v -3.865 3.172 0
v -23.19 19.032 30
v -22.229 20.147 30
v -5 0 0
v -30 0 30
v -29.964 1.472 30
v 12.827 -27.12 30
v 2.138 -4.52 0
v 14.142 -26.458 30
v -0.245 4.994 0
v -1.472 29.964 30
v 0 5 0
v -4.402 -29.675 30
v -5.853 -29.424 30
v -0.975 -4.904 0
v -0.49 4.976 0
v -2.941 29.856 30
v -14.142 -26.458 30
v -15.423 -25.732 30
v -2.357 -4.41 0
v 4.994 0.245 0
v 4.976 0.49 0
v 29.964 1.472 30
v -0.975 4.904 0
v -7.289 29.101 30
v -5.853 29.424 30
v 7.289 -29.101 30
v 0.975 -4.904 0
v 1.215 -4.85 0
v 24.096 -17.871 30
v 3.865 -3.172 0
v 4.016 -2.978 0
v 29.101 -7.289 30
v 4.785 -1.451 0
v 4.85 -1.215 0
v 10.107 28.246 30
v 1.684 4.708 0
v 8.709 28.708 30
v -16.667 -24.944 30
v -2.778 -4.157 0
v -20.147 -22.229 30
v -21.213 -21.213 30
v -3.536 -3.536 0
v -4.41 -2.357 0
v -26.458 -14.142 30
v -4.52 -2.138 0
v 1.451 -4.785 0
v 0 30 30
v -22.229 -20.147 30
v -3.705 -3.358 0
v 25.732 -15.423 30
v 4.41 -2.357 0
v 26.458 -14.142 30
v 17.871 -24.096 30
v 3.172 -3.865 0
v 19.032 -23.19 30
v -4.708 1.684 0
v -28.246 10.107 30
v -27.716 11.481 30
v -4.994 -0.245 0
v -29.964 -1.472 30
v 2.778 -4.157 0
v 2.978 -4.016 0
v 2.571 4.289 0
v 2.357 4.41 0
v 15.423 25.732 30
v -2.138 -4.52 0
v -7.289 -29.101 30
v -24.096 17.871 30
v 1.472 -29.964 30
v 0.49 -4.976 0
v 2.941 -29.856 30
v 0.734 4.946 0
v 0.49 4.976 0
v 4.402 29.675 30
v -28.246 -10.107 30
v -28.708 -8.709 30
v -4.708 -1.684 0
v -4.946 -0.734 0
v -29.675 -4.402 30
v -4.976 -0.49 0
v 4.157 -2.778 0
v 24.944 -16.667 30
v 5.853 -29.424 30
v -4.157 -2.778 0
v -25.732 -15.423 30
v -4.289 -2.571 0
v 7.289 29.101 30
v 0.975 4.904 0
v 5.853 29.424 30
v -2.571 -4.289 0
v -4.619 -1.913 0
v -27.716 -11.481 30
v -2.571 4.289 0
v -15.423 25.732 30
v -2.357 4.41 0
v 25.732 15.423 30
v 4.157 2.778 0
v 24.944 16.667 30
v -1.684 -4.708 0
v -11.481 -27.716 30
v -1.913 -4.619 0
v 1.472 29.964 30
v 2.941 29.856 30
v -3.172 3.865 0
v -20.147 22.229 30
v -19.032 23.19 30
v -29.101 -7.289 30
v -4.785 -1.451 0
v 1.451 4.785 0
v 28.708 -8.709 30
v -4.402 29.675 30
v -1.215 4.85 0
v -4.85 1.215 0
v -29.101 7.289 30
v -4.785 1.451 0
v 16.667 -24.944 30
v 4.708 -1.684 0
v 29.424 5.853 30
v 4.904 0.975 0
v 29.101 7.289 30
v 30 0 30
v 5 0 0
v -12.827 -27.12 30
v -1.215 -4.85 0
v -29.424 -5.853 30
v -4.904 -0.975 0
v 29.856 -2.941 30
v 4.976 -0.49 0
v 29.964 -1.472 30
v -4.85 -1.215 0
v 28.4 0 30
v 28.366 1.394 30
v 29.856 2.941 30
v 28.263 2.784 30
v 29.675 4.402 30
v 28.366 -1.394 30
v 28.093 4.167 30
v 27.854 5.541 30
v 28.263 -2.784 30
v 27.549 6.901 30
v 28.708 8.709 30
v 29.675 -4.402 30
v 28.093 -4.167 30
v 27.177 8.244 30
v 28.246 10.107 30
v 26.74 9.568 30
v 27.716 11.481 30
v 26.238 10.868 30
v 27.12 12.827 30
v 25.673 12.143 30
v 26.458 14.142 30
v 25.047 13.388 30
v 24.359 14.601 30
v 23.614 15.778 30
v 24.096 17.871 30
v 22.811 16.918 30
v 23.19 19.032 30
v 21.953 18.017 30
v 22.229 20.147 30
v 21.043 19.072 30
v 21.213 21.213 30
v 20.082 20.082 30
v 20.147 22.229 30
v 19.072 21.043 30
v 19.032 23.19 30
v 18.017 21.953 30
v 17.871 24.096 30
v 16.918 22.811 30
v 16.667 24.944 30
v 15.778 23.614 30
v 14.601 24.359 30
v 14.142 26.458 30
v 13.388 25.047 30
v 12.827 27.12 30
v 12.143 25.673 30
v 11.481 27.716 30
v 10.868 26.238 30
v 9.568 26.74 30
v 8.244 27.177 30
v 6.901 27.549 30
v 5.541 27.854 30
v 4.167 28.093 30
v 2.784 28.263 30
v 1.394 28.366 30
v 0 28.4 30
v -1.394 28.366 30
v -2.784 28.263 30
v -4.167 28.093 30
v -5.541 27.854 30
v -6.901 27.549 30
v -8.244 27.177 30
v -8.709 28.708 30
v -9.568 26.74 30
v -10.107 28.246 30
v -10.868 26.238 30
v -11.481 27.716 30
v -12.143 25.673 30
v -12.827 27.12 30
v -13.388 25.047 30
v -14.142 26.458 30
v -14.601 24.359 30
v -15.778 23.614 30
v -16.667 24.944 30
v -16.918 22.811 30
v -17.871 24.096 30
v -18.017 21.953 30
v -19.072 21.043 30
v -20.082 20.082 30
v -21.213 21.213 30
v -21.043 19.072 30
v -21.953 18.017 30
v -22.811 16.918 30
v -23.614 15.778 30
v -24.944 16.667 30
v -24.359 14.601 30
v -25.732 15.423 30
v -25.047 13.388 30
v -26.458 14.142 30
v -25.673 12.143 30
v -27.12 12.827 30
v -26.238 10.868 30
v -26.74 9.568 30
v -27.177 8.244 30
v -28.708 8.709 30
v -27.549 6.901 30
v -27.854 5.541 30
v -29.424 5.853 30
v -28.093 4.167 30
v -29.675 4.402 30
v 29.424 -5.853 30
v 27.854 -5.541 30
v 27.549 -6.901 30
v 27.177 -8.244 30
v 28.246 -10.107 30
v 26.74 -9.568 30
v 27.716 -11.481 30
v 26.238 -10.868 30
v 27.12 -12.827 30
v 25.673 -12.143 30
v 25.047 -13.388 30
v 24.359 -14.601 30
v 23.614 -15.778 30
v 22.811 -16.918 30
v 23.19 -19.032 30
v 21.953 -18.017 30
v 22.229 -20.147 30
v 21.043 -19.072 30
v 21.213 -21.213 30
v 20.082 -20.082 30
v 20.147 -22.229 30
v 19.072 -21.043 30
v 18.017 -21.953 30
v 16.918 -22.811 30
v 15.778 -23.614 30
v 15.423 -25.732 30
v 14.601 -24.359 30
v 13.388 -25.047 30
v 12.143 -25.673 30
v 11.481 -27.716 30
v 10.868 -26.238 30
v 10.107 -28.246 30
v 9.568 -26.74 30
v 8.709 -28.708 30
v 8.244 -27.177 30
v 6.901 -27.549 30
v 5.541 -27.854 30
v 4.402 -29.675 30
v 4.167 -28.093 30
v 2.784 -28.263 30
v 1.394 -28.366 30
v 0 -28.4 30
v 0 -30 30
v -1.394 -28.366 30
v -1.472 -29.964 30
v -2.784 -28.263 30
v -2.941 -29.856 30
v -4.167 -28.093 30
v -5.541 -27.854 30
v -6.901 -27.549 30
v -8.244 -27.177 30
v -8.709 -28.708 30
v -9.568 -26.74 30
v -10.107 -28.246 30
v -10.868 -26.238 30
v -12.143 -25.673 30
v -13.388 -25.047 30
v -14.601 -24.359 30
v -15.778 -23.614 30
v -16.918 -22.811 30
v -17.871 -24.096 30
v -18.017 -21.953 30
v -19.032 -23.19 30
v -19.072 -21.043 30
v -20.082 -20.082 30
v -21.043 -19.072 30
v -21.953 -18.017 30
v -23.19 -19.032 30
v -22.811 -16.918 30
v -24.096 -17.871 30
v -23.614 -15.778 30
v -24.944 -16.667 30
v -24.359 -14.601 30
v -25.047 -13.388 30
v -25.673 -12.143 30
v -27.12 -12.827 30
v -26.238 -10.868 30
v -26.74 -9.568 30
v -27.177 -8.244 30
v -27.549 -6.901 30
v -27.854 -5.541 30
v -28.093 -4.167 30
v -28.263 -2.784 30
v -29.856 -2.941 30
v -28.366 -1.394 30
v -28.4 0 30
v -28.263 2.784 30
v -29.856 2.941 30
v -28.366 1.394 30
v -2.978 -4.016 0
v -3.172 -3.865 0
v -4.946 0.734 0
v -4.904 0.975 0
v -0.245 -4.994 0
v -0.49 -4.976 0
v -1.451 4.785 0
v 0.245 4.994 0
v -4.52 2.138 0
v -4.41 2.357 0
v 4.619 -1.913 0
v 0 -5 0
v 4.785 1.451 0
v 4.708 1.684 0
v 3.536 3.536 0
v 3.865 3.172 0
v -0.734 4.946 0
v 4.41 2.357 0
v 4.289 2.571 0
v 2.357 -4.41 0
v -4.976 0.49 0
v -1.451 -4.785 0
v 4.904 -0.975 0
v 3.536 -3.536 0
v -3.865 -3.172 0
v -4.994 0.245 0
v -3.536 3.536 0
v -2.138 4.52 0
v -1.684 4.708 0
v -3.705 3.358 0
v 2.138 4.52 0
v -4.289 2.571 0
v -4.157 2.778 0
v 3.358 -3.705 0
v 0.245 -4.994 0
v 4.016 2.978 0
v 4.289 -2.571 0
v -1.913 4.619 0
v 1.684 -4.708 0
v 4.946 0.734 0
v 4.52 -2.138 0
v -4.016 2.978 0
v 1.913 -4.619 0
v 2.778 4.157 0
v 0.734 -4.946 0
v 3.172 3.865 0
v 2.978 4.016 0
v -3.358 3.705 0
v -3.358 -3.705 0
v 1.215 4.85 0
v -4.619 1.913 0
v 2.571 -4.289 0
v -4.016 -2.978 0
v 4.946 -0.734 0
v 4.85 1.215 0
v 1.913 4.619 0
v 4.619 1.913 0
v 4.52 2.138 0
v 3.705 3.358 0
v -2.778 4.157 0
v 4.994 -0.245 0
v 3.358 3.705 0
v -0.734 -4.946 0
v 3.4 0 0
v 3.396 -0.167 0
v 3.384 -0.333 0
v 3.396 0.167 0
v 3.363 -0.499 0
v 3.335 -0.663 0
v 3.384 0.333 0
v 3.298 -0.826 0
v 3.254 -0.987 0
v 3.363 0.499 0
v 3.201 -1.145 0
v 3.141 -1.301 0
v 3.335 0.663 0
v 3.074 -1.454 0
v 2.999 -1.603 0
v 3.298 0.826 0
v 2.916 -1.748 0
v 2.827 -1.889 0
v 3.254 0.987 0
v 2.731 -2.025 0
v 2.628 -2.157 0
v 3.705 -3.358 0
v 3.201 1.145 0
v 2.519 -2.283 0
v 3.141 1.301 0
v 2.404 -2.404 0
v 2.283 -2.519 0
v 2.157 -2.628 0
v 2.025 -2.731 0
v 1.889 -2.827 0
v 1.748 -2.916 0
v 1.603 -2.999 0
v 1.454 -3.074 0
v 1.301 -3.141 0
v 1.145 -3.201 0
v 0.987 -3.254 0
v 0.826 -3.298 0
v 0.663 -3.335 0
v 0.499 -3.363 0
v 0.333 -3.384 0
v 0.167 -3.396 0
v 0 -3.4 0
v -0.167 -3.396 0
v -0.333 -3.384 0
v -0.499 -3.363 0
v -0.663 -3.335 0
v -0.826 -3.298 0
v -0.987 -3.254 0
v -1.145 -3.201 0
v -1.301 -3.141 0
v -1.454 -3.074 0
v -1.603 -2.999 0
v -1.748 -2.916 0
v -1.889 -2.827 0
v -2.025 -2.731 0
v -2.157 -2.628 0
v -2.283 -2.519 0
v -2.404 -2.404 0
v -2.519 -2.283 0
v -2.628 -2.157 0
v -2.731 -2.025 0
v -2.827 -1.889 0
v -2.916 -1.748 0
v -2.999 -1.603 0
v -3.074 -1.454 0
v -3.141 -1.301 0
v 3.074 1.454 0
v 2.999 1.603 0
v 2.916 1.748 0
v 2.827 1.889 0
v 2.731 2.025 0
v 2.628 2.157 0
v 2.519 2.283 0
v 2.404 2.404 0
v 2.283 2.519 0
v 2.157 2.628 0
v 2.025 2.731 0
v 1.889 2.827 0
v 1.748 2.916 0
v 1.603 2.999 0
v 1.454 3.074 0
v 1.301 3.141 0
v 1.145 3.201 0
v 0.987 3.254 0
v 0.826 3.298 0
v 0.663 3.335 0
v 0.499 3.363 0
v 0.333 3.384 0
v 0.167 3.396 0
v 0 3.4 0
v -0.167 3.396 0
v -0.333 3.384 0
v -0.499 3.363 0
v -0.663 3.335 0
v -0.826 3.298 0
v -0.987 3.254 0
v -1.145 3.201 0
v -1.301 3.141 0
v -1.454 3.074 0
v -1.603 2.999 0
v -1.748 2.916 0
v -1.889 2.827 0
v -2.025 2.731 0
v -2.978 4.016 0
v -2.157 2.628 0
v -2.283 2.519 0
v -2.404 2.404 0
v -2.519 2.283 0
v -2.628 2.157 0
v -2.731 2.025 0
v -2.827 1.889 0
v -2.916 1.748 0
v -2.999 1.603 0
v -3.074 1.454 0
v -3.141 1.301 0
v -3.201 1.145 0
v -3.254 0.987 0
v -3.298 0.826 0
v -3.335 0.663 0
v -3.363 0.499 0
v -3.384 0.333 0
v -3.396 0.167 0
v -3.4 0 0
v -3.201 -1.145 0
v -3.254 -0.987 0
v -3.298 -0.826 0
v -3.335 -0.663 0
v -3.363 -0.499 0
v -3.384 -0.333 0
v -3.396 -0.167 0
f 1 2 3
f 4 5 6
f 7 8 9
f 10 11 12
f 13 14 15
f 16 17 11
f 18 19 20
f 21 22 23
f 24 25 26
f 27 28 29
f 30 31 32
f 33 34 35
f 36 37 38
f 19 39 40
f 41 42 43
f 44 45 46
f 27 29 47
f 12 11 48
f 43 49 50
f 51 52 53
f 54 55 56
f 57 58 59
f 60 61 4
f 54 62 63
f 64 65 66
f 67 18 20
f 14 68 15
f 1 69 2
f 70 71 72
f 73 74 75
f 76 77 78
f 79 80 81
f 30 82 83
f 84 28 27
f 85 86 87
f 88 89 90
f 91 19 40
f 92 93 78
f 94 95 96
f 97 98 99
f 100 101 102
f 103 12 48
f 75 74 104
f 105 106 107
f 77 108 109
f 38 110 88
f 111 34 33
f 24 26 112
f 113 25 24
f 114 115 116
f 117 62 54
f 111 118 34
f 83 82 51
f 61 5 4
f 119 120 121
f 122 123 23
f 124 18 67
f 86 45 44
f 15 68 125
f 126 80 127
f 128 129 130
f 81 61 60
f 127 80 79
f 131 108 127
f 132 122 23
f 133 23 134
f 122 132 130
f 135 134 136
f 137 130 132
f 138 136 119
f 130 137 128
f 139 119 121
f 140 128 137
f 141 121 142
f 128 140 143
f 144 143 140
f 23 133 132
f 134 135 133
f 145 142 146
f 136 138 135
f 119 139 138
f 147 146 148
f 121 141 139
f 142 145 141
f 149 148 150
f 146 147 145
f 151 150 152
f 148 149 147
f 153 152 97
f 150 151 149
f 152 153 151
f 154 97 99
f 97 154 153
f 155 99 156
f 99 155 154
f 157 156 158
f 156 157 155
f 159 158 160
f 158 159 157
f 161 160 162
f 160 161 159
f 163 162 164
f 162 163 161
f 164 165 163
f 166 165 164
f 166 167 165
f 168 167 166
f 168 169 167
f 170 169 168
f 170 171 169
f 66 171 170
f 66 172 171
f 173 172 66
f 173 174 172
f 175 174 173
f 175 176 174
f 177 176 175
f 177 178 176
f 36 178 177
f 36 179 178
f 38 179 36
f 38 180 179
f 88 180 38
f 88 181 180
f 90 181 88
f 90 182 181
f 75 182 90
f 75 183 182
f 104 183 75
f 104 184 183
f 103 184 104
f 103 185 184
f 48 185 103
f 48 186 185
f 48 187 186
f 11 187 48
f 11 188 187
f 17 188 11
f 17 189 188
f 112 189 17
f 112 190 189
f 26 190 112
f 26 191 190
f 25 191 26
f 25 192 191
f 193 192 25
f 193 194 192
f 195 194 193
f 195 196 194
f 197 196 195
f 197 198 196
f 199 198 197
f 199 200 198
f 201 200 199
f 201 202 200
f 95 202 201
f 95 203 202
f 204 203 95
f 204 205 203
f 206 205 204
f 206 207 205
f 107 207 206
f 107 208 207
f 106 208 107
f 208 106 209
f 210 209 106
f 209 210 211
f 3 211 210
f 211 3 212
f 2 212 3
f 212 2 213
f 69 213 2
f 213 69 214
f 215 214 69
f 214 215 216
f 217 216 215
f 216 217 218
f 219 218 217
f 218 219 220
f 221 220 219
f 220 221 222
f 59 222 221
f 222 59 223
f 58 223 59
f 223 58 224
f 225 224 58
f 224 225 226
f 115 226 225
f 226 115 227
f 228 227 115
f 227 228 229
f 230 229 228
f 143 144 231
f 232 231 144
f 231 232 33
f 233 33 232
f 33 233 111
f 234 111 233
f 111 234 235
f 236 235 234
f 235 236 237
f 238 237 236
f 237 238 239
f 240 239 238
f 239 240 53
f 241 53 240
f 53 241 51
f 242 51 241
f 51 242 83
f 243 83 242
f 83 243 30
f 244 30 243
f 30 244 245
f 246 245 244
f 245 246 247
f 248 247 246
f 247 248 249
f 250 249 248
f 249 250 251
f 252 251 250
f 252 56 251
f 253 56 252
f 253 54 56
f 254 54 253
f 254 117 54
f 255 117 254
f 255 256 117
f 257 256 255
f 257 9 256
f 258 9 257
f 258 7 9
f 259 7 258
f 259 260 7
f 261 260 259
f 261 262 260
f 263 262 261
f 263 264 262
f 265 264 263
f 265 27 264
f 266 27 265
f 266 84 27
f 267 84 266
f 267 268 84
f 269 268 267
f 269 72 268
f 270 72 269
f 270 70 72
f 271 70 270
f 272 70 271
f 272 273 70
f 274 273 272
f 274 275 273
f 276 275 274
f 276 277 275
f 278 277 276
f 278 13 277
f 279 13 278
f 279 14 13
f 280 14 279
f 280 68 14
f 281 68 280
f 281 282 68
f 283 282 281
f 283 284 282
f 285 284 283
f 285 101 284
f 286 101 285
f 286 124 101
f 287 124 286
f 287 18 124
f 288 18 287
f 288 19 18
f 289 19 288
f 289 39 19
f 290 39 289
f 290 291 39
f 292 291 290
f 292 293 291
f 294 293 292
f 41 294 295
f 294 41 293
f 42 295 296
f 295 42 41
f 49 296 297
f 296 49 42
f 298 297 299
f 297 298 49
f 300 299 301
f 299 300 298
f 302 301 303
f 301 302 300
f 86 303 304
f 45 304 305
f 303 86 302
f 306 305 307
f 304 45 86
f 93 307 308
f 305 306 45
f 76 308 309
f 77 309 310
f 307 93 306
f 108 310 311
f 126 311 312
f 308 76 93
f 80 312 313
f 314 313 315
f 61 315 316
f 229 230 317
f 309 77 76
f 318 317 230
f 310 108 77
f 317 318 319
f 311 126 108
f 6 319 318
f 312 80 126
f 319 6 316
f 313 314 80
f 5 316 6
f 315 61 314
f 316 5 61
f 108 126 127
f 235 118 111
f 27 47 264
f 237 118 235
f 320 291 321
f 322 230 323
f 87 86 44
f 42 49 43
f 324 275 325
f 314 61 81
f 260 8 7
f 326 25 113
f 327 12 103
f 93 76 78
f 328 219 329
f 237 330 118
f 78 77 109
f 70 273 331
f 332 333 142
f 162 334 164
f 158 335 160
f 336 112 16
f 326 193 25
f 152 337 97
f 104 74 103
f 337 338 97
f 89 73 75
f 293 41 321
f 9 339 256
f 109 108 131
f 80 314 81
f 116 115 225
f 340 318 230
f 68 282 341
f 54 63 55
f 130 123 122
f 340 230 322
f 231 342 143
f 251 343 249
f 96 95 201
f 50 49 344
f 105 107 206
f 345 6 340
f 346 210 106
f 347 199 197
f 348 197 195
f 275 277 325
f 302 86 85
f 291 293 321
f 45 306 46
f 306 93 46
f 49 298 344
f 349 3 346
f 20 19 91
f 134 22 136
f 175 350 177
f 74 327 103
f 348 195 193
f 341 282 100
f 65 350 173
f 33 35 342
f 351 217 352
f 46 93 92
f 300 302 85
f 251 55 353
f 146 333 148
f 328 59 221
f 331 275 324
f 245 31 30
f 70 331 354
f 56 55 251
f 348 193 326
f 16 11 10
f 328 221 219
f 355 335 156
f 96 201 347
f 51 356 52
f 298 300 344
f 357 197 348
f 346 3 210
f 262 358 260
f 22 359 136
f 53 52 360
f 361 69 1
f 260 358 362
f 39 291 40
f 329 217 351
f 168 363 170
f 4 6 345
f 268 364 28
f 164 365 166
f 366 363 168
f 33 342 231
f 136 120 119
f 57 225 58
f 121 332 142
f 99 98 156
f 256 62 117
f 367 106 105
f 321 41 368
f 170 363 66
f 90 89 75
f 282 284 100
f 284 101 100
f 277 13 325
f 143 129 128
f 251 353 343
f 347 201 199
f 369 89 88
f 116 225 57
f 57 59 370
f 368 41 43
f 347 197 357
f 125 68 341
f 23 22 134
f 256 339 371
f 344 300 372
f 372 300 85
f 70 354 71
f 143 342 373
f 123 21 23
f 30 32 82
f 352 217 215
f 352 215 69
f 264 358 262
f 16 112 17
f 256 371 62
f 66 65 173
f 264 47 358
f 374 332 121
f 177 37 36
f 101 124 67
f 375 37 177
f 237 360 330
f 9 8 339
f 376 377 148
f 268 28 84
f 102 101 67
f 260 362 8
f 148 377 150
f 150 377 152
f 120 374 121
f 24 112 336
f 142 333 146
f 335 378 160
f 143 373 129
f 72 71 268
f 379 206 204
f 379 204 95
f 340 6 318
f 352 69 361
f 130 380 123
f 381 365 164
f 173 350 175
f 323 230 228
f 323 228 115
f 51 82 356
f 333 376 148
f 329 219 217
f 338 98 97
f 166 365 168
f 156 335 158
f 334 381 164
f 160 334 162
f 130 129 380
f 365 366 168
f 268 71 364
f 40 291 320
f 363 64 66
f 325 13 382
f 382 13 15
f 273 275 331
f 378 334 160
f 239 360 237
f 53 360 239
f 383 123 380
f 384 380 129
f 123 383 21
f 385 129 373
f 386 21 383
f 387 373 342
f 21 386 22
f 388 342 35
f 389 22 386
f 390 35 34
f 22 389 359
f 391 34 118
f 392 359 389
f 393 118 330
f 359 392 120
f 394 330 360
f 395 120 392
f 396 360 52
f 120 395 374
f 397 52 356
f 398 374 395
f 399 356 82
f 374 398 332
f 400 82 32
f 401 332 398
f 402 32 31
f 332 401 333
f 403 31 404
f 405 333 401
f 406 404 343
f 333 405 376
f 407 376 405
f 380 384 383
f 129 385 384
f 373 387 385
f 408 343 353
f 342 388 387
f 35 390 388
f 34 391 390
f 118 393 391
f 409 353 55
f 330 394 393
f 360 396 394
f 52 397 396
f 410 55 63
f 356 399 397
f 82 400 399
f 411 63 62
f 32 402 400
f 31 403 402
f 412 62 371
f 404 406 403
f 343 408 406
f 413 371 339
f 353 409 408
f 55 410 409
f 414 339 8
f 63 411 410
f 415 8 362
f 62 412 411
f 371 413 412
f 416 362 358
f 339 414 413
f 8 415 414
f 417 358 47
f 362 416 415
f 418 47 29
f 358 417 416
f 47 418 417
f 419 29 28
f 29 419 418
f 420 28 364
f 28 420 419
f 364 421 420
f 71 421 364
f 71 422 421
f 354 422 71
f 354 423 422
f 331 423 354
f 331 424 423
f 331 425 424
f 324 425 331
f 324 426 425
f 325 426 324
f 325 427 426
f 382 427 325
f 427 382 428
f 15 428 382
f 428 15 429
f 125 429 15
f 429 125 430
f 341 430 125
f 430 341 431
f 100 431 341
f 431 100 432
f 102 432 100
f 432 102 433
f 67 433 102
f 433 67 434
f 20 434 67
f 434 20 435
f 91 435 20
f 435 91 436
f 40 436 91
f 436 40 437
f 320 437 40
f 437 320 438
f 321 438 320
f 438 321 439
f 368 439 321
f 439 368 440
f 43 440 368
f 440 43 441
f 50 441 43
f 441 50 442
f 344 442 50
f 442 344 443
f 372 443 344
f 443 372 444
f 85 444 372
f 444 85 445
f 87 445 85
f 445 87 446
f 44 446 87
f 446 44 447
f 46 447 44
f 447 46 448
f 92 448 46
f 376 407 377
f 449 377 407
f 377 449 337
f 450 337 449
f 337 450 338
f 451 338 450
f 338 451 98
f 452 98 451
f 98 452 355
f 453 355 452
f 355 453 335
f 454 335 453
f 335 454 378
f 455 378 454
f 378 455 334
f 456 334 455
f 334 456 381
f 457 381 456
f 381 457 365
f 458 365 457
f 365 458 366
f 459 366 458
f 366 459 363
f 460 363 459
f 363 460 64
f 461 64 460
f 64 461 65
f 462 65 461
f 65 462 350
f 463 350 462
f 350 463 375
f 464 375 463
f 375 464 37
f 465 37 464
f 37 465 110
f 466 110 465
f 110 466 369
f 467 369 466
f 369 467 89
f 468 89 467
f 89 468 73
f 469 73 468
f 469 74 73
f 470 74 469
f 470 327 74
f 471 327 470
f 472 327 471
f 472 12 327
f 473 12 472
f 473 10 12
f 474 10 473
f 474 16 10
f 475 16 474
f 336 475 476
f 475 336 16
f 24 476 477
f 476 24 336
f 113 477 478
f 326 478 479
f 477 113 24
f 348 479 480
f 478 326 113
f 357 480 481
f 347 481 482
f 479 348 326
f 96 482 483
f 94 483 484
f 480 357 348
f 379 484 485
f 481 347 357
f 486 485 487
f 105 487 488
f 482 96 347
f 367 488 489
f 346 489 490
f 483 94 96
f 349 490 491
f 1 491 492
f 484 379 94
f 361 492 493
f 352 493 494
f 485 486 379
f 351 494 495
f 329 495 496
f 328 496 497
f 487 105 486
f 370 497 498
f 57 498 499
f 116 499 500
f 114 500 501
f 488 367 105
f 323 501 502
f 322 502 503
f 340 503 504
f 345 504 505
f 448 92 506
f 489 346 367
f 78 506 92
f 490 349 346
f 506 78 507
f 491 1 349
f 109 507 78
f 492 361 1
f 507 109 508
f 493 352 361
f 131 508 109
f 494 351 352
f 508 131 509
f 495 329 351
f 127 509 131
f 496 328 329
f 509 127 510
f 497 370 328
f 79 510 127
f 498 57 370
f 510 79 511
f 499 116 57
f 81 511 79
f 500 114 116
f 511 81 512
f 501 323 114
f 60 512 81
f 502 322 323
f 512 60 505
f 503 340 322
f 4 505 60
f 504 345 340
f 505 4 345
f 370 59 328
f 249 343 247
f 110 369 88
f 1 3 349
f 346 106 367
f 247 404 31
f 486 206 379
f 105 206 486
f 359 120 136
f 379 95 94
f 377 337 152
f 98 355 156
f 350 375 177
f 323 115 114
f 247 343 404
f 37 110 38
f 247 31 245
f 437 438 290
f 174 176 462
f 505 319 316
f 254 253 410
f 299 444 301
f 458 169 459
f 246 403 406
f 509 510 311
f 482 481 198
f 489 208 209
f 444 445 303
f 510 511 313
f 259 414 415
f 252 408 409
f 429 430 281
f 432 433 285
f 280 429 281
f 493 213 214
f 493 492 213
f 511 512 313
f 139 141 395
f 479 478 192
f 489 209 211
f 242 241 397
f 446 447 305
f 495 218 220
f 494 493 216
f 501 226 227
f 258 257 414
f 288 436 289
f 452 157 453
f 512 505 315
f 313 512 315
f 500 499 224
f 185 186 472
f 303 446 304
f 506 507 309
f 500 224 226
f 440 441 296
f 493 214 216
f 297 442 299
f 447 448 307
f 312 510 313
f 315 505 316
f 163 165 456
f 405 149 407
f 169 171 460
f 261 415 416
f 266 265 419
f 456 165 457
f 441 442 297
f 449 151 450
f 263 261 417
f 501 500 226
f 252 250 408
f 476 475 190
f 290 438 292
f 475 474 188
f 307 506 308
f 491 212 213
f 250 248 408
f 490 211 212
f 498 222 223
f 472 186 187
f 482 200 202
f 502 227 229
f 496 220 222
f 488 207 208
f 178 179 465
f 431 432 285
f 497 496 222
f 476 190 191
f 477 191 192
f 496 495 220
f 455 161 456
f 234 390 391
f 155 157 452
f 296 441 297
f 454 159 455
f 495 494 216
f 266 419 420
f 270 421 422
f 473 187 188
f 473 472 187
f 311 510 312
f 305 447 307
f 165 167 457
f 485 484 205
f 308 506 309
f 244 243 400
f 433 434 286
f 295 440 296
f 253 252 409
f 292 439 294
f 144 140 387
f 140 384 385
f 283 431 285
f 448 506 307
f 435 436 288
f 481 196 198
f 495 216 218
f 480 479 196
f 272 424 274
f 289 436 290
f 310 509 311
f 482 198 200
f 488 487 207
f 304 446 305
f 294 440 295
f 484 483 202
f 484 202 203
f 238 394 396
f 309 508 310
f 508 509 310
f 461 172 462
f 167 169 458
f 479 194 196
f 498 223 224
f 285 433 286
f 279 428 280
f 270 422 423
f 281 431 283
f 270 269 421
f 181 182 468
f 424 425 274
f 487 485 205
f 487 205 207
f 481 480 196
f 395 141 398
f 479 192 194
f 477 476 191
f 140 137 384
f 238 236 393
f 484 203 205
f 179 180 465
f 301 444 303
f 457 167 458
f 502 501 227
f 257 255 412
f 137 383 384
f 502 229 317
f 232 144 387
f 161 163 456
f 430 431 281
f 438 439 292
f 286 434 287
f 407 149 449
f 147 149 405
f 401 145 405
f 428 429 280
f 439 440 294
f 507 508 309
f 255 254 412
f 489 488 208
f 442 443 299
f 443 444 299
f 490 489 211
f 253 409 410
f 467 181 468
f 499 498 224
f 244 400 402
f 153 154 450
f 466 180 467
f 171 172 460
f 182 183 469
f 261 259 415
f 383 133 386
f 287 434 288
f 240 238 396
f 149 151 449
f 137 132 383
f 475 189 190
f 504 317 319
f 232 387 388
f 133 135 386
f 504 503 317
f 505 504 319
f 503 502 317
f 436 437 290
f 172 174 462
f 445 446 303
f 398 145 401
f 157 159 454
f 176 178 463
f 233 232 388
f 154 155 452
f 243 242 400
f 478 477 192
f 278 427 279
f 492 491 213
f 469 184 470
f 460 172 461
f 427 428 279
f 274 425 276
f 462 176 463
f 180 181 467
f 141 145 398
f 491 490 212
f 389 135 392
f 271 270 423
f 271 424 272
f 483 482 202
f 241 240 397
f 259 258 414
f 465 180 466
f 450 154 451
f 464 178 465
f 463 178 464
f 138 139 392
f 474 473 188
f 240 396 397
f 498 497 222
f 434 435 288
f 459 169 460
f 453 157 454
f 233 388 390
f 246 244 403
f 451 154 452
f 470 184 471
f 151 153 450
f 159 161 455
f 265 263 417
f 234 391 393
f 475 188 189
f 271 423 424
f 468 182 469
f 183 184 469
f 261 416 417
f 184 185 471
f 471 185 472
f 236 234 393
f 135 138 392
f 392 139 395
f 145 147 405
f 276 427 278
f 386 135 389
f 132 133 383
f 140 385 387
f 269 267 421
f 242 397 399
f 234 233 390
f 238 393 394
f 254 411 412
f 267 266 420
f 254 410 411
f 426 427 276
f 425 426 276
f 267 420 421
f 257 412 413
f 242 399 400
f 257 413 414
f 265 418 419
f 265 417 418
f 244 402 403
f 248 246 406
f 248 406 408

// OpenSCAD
// Lab Funnel Design (Corrected)
// Units: millimetres
// Orientation: Upright, wide opening at top, resting on XY plane at z=0.

// Global settings
$fn = 128; // High resolution for smooth curves

// Dimensions
// Spout (Tube)
spout_outer_diameter = 10;
spout_inner_diameter = 6.8; // 10 - 2*1.6
spout_length = 20;
spout_wall_thickness = 1.6;

// Cone (Funnel)
cone_bottom_diameter = 10; // Matches spout outer diameter
cone_top_diameter = 60;
cone_bottom_z = 20; // Start of cone
cone_top_z = 50;    // End of cone (rim)
cone_wall_thickness = 1.6;

// Calculated Cone Dimensions
cone_bottom_radius = cone_bottom_diameter / 2;
cone_top_radius = cone_top_diameter / 2;
cone_height = cone_top_z - cone_bottom_z;

// Inner dimensions at the junction (z=20)
// The inner bore continues from the spout (6.8mm)
inner_bore_diameter = spout_inner_diameter;
inner_bore_radius = inner_bore_diameter / 2;

// Inner dimensions at the top rim (z=50)
// Outer is 60mm, wall is 1.6mm, so inner is 60 - 2*1.6 = 56.8mm
inner_top_diameter = cone_top_diameter - (2 * cone_wall_thickness);
inner_top_radius = inner_top_diameter / 2;

// Main Body Construction
// We build the solid using rotate_extrude to ensure a watertight volume.
// We define the profile in the XZ plane (rotated around Z).
// The profile starts at X=0 (center), goes to Outer Radius, then back to Inner Radius.

union() {
    // We construct the hollow shape by subtracting the inner void from the outer solid.
    // However, rotate_extrude works best on a single closed loop or a solid profile.
    // To make a hollow tube/cone easily, we extrude the outer profile and subtract the inner profile.
    
    // 1. Outer Shell
    difference() {
        // Outer Solid
        rotate_extrude(angle = 360) {
            // Profile: From center (0) to outer radius at bottom, then to outer radius at top.
            // We need to define the path in X (radius) vs Z (height).
            // Since rotate_extrude extrudes along the Z axis of the profile plane, 
            // we define points as [x, z].
            
            // Start at bottom center (0, 0)
            // Go up to bottom outer radius (cone_bottom_radius, 0)
            // Go up the cone wall to top outer radius (cone_top_radius, cone_height)
            // Go down to top center (0, cone_height)
            
            polygon(points = [
                [0, 0],
                [cone_bottom_radius, 0],
                [cone_top_radius, cone_height],
                [0, cone_height]
            ]);
        }
        
        // Inner Void (Hole)
        // The inner void is a cylinder from z=0 to z=20, then a cone from z=20 to z=50.
        // We must subtract this void to create the bore.
        rotate_extrude(angle = 360) {
            // Inner Profile:
            // Start at bottom center (0, 0)
            // Go up to inner radius at bottom (inner_bore_radius, 0)
            // Go up the inner cone wall to inner radius at top (inner_top_radius, cone_height)
            // Go down to top center (0, cone_height)
            
            polygon(points = [
                [0, 0],
                [inner_bore_radius, 0],
                [inner_top_radius, cone_height],
                [0, cone_height]
            ]);
        }
    }
}
